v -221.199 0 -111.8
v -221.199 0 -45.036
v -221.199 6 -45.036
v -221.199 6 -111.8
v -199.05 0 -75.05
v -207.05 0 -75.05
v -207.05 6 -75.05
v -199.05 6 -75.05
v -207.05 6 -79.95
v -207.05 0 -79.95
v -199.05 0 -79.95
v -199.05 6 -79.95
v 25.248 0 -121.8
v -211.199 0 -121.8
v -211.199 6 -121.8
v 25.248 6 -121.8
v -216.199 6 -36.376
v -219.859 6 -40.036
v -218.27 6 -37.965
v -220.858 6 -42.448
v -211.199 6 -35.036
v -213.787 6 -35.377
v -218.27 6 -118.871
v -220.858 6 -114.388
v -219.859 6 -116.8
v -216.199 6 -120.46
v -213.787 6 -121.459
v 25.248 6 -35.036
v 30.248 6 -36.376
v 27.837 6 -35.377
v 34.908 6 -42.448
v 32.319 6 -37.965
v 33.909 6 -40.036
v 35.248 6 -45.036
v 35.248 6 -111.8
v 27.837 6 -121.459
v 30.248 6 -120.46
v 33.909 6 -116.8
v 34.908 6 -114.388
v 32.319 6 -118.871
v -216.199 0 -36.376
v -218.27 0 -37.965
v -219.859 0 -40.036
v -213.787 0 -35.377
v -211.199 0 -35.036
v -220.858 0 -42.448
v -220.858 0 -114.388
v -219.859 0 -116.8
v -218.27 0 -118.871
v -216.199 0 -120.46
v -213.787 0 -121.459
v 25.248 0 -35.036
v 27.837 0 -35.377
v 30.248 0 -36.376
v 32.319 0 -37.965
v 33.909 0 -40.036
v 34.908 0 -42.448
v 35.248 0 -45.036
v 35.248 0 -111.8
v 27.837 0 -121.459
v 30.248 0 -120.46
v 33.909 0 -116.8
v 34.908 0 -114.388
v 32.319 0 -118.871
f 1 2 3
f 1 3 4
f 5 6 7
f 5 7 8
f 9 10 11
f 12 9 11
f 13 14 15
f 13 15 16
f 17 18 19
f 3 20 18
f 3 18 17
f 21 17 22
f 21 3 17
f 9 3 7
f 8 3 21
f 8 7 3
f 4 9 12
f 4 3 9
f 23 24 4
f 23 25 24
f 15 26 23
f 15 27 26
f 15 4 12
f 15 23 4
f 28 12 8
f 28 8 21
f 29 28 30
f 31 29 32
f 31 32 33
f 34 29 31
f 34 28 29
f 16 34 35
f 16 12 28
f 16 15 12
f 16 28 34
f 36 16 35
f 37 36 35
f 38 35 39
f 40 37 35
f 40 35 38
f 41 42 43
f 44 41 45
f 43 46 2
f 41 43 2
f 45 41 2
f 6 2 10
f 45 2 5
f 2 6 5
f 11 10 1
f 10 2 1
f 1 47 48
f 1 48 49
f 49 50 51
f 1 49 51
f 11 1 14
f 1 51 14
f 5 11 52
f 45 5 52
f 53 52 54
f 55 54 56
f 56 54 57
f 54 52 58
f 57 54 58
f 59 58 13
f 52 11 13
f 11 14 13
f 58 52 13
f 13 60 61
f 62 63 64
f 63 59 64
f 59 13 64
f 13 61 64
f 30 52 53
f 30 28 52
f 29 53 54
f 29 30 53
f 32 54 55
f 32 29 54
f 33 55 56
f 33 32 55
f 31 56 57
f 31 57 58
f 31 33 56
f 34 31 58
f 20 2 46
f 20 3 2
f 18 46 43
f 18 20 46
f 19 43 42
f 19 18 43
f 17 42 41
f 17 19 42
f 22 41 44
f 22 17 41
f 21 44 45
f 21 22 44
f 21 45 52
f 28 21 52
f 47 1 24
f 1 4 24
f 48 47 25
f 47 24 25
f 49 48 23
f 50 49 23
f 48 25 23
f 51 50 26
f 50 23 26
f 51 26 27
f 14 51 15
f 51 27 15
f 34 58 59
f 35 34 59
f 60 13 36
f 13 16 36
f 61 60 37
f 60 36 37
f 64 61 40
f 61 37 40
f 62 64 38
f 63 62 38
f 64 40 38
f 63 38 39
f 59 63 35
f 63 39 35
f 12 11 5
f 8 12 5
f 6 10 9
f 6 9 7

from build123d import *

# Parameters (mm, degrees)
SKETCH2_W               = 256.44751275
SKETCH2_H               = 86.763856324
BOSS_EXTRUDE2_DEPTH     = 6
SKETCH5_W               = 8
SKETCH5_H               = 4.9
CUT_EXTRUDE7_DEPTH      = 1
CUT_EXTRUDE7_DEPTH_BACK = 7
FILLET1_R               = 10


with BuildPart() as part:
    # Sketch2 → Boss-Extrude2 (new body)
    with BuildSketch(Plane(origin=(0, 0, 0), x_dir=(1, 0, 0), z_dir=(0, 1, 0))):
        with Locations((-92.975357556, 78.4180884)):
            Rectangle(SKETCH2_W, SKETCH2_H)
    extrude(amount=BOSS_EXTRUDE2_DEPTH)

    # Sketch5 → Cut-Extrude7 (cut, two sides)
    with BuildSketch(Plane.XZ) as cut_extrude7_sk:
        with Locations((-203.05, -77.5)):
            Rectangle(SKETCH5_W, SKETCH5_H)
    extrude(amount=CUT_EXTRUDE7_DEPTH, mode=Mode.SUBTRACT)
    extrude(cut_extrude7_sk.sketch, amount=-CUT_EXTRUDE7_DEPTH_BACK, mode=Mode.SUBTRACT)

    # Fillet1
    fillet1_edges = [part.edges().sort_by_distance(p)[0] for p in [
        (35.248398819, 3, -35.036160238),
        (-221.199113931, 3, -35.036160238),
        (-221.199113931, 3, -121.800016562),
        (35.248398819, 3, -121.800016562),
    ]]
    fillet(fillet1_edges, radius=FILLET1_R)


solid = part.part
